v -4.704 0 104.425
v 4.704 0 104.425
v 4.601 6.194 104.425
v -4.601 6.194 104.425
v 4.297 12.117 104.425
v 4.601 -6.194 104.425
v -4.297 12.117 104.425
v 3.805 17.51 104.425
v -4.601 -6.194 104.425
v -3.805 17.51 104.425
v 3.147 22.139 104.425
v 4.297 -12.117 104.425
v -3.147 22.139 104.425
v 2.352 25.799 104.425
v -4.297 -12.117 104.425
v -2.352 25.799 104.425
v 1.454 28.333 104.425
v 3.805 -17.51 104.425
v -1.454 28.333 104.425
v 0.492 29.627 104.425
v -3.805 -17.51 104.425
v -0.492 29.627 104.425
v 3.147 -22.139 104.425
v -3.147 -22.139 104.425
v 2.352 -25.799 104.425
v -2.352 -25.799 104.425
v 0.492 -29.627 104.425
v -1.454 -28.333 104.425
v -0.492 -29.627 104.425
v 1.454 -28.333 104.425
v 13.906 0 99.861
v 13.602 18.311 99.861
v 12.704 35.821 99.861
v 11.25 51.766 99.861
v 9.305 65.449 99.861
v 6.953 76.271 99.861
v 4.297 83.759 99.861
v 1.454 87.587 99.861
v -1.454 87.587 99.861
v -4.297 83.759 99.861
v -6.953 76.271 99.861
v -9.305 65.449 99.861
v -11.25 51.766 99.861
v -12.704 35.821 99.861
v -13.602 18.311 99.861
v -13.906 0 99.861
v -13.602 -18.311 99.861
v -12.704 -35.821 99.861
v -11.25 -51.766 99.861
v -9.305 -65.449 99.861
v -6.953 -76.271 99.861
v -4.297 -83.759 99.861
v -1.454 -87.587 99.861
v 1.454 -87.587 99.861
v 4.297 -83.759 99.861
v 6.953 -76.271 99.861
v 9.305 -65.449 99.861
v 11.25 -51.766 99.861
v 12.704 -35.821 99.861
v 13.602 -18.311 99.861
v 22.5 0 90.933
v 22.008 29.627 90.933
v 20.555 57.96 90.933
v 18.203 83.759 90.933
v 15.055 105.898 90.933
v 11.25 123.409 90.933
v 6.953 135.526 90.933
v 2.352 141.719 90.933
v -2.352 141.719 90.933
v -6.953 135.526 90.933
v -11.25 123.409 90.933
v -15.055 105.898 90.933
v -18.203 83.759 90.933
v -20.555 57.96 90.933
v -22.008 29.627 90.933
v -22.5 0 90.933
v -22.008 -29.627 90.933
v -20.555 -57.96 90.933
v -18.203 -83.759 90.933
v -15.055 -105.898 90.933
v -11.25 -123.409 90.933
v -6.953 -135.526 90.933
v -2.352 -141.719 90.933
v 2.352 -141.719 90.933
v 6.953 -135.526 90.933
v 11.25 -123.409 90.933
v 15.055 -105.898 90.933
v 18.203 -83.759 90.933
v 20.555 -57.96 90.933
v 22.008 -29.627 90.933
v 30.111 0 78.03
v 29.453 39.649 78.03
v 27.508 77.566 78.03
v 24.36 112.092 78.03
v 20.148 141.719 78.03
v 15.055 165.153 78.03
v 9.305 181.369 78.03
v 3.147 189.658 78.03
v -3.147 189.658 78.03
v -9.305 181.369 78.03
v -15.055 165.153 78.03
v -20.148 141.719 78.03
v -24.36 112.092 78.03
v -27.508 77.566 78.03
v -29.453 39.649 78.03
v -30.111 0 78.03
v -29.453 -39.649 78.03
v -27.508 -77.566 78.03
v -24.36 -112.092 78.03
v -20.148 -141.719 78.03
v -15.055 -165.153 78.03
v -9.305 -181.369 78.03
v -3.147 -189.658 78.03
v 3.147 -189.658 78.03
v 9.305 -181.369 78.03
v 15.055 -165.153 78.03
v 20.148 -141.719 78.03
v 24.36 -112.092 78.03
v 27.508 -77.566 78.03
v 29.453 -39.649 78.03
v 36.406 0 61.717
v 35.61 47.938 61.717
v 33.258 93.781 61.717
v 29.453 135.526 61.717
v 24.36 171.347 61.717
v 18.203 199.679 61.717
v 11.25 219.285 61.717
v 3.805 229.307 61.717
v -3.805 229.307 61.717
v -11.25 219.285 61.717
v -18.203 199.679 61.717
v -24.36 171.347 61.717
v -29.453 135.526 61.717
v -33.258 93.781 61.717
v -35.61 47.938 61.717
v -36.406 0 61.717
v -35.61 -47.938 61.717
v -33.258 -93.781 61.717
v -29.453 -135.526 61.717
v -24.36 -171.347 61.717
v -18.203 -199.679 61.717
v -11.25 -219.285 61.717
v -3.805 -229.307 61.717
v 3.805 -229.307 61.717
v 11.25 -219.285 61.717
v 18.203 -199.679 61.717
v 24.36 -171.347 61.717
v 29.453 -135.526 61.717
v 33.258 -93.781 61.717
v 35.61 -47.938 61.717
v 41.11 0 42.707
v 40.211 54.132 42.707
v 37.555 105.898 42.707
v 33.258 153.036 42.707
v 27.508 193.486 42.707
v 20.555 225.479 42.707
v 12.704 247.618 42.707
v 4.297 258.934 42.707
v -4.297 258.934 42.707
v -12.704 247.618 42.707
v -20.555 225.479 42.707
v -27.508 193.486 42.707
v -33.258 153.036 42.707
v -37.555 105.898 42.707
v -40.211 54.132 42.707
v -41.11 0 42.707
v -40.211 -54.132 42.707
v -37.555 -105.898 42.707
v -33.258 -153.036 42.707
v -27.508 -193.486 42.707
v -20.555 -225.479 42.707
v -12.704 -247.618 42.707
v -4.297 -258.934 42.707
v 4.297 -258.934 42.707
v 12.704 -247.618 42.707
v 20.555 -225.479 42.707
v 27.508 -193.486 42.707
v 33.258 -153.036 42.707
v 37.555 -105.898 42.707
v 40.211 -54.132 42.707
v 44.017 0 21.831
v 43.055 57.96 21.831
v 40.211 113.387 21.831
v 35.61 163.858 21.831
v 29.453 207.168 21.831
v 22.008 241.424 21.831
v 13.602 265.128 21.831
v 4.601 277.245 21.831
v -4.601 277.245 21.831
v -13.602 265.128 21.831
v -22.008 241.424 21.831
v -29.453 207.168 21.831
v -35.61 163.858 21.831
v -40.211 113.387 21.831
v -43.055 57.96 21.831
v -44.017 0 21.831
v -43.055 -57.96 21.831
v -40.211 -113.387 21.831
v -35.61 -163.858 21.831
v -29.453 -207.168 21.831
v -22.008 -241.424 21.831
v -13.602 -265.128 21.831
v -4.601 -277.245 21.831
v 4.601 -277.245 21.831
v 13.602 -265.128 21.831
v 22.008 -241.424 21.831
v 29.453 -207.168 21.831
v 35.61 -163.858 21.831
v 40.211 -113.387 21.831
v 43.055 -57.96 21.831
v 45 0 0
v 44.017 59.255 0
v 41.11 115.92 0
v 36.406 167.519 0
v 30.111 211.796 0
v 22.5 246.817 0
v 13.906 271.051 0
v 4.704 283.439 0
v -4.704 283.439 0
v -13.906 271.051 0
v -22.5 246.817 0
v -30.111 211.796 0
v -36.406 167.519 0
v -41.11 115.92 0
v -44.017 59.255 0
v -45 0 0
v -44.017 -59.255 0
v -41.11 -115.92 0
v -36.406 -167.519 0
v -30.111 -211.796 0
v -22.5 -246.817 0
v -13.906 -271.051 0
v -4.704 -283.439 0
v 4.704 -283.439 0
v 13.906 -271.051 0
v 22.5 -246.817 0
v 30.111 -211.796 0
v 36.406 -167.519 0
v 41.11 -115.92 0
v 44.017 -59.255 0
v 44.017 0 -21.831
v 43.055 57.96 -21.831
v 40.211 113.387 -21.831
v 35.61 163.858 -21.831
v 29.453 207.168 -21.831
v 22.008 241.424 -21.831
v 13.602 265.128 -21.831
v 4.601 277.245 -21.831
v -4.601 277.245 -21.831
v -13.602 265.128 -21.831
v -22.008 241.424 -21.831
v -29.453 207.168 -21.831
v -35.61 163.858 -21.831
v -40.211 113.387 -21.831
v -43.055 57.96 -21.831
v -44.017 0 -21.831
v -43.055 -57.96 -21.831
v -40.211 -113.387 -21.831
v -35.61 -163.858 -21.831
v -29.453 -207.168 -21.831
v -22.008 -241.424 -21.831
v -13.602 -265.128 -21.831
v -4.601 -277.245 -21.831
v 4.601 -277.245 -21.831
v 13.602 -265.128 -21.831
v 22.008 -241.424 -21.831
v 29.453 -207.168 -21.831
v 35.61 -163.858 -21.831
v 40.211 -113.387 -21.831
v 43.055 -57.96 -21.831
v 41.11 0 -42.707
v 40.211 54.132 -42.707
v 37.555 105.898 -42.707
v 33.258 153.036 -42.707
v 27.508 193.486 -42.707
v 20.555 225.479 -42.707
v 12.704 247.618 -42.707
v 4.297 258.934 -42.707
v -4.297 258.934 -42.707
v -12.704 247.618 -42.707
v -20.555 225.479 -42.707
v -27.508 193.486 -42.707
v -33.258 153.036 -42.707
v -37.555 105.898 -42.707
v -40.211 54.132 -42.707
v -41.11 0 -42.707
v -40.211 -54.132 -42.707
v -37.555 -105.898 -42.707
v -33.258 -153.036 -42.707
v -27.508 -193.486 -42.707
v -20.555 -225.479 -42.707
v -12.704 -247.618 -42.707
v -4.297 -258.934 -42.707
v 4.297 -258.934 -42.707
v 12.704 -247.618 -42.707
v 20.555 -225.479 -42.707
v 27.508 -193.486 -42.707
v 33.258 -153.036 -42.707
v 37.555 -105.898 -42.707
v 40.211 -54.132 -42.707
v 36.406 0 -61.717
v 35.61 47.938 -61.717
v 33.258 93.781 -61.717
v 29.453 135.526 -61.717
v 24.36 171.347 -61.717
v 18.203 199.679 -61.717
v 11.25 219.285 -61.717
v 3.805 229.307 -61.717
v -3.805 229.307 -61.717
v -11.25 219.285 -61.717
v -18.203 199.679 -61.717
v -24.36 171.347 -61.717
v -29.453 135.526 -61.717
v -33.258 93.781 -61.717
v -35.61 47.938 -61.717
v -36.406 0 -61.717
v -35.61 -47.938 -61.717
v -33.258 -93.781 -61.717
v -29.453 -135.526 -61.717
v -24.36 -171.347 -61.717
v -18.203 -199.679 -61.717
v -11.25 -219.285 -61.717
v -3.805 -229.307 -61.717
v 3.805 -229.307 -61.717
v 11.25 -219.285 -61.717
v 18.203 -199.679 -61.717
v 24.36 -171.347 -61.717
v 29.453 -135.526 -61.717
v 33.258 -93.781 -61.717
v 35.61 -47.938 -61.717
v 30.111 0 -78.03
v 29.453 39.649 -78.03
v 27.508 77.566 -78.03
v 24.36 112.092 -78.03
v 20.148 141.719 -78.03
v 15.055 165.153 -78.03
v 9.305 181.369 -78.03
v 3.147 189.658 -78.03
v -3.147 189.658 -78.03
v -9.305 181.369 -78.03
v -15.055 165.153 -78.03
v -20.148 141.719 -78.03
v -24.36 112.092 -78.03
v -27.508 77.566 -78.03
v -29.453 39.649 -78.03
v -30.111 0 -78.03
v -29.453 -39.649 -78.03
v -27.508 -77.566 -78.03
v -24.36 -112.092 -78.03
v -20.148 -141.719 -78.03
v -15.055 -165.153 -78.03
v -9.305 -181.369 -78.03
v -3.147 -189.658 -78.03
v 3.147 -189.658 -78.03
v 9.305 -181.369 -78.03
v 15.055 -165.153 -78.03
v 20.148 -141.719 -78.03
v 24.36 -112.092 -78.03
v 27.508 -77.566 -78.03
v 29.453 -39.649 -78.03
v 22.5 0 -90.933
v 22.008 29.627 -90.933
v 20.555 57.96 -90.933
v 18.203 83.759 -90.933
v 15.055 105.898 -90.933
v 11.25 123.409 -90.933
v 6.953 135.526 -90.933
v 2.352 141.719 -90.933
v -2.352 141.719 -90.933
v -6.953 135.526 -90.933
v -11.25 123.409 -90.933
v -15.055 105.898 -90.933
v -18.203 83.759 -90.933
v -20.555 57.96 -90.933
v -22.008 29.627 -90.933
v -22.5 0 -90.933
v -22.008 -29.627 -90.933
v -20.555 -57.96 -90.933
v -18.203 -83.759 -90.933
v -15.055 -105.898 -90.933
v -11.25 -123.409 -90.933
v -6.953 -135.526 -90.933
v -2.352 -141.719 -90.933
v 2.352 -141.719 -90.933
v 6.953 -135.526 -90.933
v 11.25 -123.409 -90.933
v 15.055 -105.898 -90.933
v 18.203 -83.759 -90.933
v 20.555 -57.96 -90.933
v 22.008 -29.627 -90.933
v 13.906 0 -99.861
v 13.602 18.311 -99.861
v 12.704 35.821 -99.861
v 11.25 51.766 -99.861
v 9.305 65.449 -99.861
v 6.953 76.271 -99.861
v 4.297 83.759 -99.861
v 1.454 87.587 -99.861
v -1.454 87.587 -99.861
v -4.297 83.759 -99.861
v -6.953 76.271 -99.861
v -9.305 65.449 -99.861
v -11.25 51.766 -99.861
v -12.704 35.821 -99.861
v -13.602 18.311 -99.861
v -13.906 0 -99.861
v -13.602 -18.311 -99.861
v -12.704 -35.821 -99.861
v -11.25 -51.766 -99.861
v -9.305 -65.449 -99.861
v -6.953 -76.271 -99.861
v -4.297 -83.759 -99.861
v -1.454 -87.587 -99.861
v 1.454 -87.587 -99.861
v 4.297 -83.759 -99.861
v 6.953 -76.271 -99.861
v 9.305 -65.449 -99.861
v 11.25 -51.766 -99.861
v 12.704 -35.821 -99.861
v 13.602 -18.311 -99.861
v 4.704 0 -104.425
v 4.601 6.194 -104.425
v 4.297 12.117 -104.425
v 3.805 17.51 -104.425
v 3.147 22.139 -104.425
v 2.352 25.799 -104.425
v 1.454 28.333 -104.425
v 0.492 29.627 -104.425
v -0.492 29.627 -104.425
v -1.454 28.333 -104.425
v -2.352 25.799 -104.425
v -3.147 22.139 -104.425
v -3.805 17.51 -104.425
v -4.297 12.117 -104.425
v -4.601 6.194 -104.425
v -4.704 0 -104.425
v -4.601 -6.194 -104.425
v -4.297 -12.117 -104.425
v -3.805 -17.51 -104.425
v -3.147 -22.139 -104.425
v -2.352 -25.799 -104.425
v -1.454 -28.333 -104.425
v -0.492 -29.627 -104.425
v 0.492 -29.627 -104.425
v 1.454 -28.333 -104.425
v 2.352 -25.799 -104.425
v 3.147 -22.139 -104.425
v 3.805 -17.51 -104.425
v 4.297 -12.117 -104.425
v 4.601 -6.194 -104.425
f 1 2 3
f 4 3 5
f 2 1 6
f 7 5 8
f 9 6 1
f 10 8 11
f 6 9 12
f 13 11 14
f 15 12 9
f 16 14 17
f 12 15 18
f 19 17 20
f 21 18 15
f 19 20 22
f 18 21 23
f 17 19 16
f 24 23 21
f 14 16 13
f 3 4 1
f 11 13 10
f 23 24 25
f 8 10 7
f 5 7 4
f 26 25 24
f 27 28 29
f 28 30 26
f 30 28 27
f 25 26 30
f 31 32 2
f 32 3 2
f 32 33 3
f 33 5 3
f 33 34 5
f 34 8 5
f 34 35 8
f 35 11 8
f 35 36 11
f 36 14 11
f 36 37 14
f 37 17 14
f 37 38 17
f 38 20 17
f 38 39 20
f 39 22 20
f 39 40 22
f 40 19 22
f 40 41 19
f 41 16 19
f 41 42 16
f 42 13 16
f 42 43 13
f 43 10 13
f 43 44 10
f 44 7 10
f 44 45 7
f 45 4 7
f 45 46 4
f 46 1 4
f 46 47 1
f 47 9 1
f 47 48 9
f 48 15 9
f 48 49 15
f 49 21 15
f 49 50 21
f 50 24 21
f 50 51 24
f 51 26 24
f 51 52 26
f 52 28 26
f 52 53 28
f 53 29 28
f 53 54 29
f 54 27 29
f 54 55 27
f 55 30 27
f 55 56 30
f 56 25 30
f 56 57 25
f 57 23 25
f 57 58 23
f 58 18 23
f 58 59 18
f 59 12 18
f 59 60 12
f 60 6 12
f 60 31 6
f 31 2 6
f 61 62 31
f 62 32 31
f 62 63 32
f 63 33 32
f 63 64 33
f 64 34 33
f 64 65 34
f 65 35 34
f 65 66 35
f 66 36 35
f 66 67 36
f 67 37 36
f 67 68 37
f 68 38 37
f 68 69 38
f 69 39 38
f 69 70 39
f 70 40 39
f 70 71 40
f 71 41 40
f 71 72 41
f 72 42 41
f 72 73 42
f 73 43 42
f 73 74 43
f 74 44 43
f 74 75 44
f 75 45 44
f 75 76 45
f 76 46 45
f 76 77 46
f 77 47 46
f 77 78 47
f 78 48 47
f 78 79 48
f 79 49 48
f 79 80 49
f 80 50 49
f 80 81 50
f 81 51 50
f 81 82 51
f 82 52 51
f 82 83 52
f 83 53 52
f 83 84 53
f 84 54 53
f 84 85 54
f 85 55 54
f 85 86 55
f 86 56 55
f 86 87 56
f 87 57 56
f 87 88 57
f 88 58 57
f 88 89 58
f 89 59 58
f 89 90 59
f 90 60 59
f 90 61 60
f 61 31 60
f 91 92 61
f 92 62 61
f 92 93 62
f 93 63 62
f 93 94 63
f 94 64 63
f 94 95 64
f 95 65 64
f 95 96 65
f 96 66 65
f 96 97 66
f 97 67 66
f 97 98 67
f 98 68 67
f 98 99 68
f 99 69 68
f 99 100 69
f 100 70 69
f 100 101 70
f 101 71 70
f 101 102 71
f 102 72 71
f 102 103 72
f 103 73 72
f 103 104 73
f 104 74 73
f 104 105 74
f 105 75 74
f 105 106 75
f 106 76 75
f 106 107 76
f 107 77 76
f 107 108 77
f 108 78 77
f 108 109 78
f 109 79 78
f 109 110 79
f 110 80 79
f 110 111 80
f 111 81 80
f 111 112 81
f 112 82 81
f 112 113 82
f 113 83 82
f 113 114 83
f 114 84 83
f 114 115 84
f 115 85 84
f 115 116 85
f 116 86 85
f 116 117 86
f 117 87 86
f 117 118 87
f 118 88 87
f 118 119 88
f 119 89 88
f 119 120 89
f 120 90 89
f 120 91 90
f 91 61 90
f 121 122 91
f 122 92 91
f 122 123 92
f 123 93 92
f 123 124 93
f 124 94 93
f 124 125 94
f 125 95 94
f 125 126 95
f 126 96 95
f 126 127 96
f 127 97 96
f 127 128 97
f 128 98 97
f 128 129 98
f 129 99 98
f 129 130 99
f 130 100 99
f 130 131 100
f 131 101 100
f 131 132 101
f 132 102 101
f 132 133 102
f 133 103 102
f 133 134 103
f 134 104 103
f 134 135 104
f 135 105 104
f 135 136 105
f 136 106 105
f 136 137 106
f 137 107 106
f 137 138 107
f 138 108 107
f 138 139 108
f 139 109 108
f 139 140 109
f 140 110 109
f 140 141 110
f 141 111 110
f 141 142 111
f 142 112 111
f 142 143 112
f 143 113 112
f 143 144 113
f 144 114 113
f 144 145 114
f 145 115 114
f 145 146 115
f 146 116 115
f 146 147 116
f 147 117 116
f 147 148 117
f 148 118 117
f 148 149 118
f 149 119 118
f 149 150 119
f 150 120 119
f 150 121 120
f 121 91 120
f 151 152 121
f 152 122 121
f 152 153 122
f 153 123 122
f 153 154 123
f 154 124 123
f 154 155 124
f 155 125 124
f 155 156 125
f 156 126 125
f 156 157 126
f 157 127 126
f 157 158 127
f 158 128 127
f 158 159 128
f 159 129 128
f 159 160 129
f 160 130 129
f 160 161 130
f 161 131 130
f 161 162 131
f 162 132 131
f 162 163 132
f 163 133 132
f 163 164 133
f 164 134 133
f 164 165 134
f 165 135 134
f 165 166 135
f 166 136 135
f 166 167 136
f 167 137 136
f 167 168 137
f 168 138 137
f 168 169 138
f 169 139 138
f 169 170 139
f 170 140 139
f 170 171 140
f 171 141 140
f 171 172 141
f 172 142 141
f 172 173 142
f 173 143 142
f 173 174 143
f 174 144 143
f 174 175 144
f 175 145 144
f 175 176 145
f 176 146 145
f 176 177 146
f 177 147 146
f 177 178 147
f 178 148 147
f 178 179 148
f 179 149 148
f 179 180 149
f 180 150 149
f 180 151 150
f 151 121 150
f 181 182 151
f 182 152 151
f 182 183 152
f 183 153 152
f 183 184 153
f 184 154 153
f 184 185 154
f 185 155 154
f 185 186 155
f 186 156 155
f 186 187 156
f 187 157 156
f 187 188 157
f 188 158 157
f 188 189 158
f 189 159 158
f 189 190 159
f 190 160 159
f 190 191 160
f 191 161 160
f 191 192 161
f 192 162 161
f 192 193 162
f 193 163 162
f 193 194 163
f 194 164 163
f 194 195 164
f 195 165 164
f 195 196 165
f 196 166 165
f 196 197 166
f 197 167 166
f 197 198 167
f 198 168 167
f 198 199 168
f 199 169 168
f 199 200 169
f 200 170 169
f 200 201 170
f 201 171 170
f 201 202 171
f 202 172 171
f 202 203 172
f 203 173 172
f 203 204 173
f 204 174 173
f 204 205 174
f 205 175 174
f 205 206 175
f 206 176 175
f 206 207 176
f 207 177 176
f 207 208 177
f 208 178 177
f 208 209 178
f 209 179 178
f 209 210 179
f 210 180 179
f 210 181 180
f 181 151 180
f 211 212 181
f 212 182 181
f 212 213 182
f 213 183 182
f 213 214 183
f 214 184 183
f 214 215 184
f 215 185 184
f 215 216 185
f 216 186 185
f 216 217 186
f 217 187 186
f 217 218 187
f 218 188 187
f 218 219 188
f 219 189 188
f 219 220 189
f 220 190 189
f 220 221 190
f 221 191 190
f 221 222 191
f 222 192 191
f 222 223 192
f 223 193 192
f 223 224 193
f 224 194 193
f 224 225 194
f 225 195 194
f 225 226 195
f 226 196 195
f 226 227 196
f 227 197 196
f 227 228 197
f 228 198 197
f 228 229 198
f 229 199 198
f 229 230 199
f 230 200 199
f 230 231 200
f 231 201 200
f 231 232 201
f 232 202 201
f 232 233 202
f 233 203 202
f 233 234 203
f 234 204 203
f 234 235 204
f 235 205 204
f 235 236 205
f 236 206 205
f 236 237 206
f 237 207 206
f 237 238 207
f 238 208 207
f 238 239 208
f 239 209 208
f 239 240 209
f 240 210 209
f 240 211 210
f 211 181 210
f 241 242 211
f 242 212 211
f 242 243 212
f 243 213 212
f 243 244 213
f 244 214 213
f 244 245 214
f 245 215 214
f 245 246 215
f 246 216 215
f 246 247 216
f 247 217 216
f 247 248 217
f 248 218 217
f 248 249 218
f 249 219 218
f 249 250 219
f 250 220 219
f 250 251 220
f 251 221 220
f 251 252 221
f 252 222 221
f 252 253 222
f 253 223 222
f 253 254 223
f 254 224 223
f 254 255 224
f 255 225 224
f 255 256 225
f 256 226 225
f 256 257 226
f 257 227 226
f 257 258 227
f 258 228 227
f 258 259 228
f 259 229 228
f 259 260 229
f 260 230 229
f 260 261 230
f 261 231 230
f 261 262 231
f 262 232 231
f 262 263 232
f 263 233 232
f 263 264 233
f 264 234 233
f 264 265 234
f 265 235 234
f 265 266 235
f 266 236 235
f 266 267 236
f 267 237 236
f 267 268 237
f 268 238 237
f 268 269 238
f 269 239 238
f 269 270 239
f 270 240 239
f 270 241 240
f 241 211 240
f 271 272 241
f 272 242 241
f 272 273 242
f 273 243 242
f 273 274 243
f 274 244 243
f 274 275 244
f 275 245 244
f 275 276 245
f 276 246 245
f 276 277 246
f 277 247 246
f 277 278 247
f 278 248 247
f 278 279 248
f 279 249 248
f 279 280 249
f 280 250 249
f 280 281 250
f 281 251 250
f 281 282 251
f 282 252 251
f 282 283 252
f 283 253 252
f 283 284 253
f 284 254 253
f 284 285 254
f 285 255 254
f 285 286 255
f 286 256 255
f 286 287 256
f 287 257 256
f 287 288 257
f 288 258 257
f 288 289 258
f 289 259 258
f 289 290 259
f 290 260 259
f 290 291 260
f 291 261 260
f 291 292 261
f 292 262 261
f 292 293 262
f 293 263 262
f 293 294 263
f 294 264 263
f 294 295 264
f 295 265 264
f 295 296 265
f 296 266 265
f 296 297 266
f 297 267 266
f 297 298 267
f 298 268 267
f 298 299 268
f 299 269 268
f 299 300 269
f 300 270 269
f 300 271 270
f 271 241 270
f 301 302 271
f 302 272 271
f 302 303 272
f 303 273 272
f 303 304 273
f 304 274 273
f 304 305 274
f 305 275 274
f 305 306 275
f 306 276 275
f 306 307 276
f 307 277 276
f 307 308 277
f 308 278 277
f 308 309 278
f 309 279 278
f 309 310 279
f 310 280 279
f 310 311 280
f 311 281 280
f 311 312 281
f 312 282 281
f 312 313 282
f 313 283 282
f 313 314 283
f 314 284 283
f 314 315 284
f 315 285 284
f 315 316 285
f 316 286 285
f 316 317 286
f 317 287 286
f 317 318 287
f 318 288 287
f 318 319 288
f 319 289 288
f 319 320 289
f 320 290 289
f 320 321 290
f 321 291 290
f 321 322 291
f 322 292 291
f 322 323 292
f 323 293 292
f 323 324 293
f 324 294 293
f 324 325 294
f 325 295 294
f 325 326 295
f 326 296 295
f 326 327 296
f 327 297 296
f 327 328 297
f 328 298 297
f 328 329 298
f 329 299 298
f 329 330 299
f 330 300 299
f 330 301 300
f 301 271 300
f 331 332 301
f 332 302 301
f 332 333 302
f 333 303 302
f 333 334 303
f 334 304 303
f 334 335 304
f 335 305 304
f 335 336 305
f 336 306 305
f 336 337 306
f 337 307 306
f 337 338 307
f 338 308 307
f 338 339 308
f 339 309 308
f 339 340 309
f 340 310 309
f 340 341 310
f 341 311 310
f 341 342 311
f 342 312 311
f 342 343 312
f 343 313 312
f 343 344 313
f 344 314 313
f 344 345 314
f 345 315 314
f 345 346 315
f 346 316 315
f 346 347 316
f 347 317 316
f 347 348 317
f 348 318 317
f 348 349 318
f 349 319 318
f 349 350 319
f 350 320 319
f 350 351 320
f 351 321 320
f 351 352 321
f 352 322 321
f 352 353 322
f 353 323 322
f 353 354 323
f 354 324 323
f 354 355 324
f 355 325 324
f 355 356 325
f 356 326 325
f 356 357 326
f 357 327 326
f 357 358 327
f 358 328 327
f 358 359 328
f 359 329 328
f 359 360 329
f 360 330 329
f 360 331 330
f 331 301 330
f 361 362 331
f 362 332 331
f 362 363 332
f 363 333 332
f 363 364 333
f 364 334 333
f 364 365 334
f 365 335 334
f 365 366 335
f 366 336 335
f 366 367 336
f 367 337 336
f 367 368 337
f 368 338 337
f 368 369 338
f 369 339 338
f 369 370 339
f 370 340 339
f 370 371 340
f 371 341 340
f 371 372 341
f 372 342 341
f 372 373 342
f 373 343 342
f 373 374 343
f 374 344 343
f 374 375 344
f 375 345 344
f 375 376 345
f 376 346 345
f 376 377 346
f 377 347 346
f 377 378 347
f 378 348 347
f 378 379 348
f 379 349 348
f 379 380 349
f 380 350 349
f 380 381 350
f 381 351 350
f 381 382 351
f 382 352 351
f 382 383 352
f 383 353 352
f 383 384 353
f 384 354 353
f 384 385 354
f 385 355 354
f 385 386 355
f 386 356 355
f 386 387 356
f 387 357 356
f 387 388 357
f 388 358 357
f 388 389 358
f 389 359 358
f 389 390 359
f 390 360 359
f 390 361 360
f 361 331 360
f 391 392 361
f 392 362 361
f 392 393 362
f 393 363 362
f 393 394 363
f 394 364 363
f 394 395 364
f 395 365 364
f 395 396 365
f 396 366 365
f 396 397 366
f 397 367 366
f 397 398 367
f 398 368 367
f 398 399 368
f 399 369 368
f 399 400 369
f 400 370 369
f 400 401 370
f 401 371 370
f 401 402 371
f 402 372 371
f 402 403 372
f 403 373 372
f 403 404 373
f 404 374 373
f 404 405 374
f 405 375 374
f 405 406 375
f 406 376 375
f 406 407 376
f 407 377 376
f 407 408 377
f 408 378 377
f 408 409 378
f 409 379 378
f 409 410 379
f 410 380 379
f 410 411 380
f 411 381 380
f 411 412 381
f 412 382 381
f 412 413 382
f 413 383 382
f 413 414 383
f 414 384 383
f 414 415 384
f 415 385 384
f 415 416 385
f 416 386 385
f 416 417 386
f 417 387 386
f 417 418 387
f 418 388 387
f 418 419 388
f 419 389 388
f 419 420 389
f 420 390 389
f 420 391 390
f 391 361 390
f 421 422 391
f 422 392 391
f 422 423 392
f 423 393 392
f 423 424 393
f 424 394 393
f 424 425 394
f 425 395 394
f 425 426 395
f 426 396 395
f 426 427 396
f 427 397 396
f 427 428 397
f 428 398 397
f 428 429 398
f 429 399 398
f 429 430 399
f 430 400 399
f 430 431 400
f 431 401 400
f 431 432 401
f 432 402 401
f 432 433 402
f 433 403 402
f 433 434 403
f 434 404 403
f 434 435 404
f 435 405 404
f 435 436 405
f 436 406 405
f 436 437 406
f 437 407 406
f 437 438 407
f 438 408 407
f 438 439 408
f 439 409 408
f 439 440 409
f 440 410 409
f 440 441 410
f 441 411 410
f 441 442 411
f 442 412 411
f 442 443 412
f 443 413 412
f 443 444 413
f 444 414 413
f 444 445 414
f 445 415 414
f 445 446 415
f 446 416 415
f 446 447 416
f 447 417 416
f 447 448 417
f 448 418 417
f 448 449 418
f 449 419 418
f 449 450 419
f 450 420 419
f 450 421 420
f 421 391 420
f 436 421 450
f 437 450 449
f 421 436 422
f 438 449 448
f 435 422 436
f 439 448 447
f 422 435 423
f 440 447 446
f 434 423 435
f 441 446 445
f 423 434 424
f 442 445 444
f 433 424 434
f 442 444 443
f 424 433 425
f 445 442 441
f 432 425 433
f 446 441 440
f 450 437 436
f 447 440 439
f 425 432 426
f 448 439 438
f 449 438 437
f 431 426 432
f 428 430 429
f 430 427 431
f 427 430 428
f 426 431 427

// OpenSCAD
// Generated by SolidPython 1.0.1 on 2020-07-29 00:46:46


scale(v = [3, 19, 7]) {
	sphere(r = 15);
}
/***********************************************
*********      SolidPython code:      **********
************************************************
 
# import packages: SolidPython
from solid import *
from solid.utils import *
from itertools import chain, combinations, permutations


class Resize:

    def __init__(self, scad_file):
        self.scad_file = scad_file
        #self.scad_file = import_scad(scad_file)
        # cone/cylinder param:
        self.r1 = 0
        self.r2 = 0
        self.h = 0
        # rectangular prism param:
        self.w = 0
        self.l = 0
        # ellipse param:
        self.r = 0

    # import OpenScad code (file name corresponds to shape)


    # classify shape + parameters
    def assign(self, param1, param2, param3):
        if self.scad_file == 'cone.scad':
            self.r1 = param1
            self.r2 = param2
            self.h = param3
        elif self.scad_file == 'cylinder.scad':
            self.r1 = param1
            self.r2 = param2
            self.h = param3
        elif self.scad_file == 'rectangularPrism.scad':
            self.h = param1
            self.l = param2
            self.w = param3
        else:
            self.r = param1
            self.h = param2

    # resize parameters
    def iterate(self):
        x = range(3, 20, 2)
        i = 1
        if self.scad_file == 'cone.scad':
            tempList = list(permutations(x, 2))
            for temp in tempList:
                param1 = temp[0]
                param2 = temp[1]
                filepath = 'produced_scad_files/' + 'cone' + str(param1) + '_' + str(param2) + '_' + '.scad'
                scad_render_to_file(cylinder(h=param1, r1=param2, r2=0), filepath)

        elif self.scad_file == 'cylinder.scad':
            tempList = list(permutations(x, 3))
            for temp in tempList:
                param1 = temp[0]
                param2 = temp[1]
                filepath = 'produced_scad_files/' + 'cylinder' + str(param1) + '_' + str(param2) + '_' + '.scad'
                scad_render_to_file(cylinder(h=param1, r1=param2, r2=param2), filepath)

        elif self.scad_file == 'rectangularPrism.scad':
            tempList = list(permutations(x, 3))
            for temp in tempList:
                param1 = temp[0]
                param2 = temp[1]
                param3 = temp[2]
                filepath = 'produced_scad_files/' + 'rectangularPrism' + str(param1) + '_' + str(param2) + '_' + str(
                    param3) + '.scad'
                scad_render_to_file(cube(size=(param1, param2, param3)), filepath)

        elif self.scad_file == 'ellipse.scad':
            tempList = list(permutations(x, 4))
            for temp in tempList:
                param1 = temp[0]
                param2 = temp[1]
                param3 = temp[2]
                param4 = temp[3]
                filepath = 'produced_scad_files/' + 'ellipse' + str(param1) + '_' + str(param2) + '_' + str(param3) + '_' + str(param4) + '.scad'
                scad_render_to_file(scale([param1, param2, param3])(sphere(r=param4)), filepath)

    def render_to_scadfile(self):
        scad_render_to_file(scad, 'example.scad') 
 
************************************************/
